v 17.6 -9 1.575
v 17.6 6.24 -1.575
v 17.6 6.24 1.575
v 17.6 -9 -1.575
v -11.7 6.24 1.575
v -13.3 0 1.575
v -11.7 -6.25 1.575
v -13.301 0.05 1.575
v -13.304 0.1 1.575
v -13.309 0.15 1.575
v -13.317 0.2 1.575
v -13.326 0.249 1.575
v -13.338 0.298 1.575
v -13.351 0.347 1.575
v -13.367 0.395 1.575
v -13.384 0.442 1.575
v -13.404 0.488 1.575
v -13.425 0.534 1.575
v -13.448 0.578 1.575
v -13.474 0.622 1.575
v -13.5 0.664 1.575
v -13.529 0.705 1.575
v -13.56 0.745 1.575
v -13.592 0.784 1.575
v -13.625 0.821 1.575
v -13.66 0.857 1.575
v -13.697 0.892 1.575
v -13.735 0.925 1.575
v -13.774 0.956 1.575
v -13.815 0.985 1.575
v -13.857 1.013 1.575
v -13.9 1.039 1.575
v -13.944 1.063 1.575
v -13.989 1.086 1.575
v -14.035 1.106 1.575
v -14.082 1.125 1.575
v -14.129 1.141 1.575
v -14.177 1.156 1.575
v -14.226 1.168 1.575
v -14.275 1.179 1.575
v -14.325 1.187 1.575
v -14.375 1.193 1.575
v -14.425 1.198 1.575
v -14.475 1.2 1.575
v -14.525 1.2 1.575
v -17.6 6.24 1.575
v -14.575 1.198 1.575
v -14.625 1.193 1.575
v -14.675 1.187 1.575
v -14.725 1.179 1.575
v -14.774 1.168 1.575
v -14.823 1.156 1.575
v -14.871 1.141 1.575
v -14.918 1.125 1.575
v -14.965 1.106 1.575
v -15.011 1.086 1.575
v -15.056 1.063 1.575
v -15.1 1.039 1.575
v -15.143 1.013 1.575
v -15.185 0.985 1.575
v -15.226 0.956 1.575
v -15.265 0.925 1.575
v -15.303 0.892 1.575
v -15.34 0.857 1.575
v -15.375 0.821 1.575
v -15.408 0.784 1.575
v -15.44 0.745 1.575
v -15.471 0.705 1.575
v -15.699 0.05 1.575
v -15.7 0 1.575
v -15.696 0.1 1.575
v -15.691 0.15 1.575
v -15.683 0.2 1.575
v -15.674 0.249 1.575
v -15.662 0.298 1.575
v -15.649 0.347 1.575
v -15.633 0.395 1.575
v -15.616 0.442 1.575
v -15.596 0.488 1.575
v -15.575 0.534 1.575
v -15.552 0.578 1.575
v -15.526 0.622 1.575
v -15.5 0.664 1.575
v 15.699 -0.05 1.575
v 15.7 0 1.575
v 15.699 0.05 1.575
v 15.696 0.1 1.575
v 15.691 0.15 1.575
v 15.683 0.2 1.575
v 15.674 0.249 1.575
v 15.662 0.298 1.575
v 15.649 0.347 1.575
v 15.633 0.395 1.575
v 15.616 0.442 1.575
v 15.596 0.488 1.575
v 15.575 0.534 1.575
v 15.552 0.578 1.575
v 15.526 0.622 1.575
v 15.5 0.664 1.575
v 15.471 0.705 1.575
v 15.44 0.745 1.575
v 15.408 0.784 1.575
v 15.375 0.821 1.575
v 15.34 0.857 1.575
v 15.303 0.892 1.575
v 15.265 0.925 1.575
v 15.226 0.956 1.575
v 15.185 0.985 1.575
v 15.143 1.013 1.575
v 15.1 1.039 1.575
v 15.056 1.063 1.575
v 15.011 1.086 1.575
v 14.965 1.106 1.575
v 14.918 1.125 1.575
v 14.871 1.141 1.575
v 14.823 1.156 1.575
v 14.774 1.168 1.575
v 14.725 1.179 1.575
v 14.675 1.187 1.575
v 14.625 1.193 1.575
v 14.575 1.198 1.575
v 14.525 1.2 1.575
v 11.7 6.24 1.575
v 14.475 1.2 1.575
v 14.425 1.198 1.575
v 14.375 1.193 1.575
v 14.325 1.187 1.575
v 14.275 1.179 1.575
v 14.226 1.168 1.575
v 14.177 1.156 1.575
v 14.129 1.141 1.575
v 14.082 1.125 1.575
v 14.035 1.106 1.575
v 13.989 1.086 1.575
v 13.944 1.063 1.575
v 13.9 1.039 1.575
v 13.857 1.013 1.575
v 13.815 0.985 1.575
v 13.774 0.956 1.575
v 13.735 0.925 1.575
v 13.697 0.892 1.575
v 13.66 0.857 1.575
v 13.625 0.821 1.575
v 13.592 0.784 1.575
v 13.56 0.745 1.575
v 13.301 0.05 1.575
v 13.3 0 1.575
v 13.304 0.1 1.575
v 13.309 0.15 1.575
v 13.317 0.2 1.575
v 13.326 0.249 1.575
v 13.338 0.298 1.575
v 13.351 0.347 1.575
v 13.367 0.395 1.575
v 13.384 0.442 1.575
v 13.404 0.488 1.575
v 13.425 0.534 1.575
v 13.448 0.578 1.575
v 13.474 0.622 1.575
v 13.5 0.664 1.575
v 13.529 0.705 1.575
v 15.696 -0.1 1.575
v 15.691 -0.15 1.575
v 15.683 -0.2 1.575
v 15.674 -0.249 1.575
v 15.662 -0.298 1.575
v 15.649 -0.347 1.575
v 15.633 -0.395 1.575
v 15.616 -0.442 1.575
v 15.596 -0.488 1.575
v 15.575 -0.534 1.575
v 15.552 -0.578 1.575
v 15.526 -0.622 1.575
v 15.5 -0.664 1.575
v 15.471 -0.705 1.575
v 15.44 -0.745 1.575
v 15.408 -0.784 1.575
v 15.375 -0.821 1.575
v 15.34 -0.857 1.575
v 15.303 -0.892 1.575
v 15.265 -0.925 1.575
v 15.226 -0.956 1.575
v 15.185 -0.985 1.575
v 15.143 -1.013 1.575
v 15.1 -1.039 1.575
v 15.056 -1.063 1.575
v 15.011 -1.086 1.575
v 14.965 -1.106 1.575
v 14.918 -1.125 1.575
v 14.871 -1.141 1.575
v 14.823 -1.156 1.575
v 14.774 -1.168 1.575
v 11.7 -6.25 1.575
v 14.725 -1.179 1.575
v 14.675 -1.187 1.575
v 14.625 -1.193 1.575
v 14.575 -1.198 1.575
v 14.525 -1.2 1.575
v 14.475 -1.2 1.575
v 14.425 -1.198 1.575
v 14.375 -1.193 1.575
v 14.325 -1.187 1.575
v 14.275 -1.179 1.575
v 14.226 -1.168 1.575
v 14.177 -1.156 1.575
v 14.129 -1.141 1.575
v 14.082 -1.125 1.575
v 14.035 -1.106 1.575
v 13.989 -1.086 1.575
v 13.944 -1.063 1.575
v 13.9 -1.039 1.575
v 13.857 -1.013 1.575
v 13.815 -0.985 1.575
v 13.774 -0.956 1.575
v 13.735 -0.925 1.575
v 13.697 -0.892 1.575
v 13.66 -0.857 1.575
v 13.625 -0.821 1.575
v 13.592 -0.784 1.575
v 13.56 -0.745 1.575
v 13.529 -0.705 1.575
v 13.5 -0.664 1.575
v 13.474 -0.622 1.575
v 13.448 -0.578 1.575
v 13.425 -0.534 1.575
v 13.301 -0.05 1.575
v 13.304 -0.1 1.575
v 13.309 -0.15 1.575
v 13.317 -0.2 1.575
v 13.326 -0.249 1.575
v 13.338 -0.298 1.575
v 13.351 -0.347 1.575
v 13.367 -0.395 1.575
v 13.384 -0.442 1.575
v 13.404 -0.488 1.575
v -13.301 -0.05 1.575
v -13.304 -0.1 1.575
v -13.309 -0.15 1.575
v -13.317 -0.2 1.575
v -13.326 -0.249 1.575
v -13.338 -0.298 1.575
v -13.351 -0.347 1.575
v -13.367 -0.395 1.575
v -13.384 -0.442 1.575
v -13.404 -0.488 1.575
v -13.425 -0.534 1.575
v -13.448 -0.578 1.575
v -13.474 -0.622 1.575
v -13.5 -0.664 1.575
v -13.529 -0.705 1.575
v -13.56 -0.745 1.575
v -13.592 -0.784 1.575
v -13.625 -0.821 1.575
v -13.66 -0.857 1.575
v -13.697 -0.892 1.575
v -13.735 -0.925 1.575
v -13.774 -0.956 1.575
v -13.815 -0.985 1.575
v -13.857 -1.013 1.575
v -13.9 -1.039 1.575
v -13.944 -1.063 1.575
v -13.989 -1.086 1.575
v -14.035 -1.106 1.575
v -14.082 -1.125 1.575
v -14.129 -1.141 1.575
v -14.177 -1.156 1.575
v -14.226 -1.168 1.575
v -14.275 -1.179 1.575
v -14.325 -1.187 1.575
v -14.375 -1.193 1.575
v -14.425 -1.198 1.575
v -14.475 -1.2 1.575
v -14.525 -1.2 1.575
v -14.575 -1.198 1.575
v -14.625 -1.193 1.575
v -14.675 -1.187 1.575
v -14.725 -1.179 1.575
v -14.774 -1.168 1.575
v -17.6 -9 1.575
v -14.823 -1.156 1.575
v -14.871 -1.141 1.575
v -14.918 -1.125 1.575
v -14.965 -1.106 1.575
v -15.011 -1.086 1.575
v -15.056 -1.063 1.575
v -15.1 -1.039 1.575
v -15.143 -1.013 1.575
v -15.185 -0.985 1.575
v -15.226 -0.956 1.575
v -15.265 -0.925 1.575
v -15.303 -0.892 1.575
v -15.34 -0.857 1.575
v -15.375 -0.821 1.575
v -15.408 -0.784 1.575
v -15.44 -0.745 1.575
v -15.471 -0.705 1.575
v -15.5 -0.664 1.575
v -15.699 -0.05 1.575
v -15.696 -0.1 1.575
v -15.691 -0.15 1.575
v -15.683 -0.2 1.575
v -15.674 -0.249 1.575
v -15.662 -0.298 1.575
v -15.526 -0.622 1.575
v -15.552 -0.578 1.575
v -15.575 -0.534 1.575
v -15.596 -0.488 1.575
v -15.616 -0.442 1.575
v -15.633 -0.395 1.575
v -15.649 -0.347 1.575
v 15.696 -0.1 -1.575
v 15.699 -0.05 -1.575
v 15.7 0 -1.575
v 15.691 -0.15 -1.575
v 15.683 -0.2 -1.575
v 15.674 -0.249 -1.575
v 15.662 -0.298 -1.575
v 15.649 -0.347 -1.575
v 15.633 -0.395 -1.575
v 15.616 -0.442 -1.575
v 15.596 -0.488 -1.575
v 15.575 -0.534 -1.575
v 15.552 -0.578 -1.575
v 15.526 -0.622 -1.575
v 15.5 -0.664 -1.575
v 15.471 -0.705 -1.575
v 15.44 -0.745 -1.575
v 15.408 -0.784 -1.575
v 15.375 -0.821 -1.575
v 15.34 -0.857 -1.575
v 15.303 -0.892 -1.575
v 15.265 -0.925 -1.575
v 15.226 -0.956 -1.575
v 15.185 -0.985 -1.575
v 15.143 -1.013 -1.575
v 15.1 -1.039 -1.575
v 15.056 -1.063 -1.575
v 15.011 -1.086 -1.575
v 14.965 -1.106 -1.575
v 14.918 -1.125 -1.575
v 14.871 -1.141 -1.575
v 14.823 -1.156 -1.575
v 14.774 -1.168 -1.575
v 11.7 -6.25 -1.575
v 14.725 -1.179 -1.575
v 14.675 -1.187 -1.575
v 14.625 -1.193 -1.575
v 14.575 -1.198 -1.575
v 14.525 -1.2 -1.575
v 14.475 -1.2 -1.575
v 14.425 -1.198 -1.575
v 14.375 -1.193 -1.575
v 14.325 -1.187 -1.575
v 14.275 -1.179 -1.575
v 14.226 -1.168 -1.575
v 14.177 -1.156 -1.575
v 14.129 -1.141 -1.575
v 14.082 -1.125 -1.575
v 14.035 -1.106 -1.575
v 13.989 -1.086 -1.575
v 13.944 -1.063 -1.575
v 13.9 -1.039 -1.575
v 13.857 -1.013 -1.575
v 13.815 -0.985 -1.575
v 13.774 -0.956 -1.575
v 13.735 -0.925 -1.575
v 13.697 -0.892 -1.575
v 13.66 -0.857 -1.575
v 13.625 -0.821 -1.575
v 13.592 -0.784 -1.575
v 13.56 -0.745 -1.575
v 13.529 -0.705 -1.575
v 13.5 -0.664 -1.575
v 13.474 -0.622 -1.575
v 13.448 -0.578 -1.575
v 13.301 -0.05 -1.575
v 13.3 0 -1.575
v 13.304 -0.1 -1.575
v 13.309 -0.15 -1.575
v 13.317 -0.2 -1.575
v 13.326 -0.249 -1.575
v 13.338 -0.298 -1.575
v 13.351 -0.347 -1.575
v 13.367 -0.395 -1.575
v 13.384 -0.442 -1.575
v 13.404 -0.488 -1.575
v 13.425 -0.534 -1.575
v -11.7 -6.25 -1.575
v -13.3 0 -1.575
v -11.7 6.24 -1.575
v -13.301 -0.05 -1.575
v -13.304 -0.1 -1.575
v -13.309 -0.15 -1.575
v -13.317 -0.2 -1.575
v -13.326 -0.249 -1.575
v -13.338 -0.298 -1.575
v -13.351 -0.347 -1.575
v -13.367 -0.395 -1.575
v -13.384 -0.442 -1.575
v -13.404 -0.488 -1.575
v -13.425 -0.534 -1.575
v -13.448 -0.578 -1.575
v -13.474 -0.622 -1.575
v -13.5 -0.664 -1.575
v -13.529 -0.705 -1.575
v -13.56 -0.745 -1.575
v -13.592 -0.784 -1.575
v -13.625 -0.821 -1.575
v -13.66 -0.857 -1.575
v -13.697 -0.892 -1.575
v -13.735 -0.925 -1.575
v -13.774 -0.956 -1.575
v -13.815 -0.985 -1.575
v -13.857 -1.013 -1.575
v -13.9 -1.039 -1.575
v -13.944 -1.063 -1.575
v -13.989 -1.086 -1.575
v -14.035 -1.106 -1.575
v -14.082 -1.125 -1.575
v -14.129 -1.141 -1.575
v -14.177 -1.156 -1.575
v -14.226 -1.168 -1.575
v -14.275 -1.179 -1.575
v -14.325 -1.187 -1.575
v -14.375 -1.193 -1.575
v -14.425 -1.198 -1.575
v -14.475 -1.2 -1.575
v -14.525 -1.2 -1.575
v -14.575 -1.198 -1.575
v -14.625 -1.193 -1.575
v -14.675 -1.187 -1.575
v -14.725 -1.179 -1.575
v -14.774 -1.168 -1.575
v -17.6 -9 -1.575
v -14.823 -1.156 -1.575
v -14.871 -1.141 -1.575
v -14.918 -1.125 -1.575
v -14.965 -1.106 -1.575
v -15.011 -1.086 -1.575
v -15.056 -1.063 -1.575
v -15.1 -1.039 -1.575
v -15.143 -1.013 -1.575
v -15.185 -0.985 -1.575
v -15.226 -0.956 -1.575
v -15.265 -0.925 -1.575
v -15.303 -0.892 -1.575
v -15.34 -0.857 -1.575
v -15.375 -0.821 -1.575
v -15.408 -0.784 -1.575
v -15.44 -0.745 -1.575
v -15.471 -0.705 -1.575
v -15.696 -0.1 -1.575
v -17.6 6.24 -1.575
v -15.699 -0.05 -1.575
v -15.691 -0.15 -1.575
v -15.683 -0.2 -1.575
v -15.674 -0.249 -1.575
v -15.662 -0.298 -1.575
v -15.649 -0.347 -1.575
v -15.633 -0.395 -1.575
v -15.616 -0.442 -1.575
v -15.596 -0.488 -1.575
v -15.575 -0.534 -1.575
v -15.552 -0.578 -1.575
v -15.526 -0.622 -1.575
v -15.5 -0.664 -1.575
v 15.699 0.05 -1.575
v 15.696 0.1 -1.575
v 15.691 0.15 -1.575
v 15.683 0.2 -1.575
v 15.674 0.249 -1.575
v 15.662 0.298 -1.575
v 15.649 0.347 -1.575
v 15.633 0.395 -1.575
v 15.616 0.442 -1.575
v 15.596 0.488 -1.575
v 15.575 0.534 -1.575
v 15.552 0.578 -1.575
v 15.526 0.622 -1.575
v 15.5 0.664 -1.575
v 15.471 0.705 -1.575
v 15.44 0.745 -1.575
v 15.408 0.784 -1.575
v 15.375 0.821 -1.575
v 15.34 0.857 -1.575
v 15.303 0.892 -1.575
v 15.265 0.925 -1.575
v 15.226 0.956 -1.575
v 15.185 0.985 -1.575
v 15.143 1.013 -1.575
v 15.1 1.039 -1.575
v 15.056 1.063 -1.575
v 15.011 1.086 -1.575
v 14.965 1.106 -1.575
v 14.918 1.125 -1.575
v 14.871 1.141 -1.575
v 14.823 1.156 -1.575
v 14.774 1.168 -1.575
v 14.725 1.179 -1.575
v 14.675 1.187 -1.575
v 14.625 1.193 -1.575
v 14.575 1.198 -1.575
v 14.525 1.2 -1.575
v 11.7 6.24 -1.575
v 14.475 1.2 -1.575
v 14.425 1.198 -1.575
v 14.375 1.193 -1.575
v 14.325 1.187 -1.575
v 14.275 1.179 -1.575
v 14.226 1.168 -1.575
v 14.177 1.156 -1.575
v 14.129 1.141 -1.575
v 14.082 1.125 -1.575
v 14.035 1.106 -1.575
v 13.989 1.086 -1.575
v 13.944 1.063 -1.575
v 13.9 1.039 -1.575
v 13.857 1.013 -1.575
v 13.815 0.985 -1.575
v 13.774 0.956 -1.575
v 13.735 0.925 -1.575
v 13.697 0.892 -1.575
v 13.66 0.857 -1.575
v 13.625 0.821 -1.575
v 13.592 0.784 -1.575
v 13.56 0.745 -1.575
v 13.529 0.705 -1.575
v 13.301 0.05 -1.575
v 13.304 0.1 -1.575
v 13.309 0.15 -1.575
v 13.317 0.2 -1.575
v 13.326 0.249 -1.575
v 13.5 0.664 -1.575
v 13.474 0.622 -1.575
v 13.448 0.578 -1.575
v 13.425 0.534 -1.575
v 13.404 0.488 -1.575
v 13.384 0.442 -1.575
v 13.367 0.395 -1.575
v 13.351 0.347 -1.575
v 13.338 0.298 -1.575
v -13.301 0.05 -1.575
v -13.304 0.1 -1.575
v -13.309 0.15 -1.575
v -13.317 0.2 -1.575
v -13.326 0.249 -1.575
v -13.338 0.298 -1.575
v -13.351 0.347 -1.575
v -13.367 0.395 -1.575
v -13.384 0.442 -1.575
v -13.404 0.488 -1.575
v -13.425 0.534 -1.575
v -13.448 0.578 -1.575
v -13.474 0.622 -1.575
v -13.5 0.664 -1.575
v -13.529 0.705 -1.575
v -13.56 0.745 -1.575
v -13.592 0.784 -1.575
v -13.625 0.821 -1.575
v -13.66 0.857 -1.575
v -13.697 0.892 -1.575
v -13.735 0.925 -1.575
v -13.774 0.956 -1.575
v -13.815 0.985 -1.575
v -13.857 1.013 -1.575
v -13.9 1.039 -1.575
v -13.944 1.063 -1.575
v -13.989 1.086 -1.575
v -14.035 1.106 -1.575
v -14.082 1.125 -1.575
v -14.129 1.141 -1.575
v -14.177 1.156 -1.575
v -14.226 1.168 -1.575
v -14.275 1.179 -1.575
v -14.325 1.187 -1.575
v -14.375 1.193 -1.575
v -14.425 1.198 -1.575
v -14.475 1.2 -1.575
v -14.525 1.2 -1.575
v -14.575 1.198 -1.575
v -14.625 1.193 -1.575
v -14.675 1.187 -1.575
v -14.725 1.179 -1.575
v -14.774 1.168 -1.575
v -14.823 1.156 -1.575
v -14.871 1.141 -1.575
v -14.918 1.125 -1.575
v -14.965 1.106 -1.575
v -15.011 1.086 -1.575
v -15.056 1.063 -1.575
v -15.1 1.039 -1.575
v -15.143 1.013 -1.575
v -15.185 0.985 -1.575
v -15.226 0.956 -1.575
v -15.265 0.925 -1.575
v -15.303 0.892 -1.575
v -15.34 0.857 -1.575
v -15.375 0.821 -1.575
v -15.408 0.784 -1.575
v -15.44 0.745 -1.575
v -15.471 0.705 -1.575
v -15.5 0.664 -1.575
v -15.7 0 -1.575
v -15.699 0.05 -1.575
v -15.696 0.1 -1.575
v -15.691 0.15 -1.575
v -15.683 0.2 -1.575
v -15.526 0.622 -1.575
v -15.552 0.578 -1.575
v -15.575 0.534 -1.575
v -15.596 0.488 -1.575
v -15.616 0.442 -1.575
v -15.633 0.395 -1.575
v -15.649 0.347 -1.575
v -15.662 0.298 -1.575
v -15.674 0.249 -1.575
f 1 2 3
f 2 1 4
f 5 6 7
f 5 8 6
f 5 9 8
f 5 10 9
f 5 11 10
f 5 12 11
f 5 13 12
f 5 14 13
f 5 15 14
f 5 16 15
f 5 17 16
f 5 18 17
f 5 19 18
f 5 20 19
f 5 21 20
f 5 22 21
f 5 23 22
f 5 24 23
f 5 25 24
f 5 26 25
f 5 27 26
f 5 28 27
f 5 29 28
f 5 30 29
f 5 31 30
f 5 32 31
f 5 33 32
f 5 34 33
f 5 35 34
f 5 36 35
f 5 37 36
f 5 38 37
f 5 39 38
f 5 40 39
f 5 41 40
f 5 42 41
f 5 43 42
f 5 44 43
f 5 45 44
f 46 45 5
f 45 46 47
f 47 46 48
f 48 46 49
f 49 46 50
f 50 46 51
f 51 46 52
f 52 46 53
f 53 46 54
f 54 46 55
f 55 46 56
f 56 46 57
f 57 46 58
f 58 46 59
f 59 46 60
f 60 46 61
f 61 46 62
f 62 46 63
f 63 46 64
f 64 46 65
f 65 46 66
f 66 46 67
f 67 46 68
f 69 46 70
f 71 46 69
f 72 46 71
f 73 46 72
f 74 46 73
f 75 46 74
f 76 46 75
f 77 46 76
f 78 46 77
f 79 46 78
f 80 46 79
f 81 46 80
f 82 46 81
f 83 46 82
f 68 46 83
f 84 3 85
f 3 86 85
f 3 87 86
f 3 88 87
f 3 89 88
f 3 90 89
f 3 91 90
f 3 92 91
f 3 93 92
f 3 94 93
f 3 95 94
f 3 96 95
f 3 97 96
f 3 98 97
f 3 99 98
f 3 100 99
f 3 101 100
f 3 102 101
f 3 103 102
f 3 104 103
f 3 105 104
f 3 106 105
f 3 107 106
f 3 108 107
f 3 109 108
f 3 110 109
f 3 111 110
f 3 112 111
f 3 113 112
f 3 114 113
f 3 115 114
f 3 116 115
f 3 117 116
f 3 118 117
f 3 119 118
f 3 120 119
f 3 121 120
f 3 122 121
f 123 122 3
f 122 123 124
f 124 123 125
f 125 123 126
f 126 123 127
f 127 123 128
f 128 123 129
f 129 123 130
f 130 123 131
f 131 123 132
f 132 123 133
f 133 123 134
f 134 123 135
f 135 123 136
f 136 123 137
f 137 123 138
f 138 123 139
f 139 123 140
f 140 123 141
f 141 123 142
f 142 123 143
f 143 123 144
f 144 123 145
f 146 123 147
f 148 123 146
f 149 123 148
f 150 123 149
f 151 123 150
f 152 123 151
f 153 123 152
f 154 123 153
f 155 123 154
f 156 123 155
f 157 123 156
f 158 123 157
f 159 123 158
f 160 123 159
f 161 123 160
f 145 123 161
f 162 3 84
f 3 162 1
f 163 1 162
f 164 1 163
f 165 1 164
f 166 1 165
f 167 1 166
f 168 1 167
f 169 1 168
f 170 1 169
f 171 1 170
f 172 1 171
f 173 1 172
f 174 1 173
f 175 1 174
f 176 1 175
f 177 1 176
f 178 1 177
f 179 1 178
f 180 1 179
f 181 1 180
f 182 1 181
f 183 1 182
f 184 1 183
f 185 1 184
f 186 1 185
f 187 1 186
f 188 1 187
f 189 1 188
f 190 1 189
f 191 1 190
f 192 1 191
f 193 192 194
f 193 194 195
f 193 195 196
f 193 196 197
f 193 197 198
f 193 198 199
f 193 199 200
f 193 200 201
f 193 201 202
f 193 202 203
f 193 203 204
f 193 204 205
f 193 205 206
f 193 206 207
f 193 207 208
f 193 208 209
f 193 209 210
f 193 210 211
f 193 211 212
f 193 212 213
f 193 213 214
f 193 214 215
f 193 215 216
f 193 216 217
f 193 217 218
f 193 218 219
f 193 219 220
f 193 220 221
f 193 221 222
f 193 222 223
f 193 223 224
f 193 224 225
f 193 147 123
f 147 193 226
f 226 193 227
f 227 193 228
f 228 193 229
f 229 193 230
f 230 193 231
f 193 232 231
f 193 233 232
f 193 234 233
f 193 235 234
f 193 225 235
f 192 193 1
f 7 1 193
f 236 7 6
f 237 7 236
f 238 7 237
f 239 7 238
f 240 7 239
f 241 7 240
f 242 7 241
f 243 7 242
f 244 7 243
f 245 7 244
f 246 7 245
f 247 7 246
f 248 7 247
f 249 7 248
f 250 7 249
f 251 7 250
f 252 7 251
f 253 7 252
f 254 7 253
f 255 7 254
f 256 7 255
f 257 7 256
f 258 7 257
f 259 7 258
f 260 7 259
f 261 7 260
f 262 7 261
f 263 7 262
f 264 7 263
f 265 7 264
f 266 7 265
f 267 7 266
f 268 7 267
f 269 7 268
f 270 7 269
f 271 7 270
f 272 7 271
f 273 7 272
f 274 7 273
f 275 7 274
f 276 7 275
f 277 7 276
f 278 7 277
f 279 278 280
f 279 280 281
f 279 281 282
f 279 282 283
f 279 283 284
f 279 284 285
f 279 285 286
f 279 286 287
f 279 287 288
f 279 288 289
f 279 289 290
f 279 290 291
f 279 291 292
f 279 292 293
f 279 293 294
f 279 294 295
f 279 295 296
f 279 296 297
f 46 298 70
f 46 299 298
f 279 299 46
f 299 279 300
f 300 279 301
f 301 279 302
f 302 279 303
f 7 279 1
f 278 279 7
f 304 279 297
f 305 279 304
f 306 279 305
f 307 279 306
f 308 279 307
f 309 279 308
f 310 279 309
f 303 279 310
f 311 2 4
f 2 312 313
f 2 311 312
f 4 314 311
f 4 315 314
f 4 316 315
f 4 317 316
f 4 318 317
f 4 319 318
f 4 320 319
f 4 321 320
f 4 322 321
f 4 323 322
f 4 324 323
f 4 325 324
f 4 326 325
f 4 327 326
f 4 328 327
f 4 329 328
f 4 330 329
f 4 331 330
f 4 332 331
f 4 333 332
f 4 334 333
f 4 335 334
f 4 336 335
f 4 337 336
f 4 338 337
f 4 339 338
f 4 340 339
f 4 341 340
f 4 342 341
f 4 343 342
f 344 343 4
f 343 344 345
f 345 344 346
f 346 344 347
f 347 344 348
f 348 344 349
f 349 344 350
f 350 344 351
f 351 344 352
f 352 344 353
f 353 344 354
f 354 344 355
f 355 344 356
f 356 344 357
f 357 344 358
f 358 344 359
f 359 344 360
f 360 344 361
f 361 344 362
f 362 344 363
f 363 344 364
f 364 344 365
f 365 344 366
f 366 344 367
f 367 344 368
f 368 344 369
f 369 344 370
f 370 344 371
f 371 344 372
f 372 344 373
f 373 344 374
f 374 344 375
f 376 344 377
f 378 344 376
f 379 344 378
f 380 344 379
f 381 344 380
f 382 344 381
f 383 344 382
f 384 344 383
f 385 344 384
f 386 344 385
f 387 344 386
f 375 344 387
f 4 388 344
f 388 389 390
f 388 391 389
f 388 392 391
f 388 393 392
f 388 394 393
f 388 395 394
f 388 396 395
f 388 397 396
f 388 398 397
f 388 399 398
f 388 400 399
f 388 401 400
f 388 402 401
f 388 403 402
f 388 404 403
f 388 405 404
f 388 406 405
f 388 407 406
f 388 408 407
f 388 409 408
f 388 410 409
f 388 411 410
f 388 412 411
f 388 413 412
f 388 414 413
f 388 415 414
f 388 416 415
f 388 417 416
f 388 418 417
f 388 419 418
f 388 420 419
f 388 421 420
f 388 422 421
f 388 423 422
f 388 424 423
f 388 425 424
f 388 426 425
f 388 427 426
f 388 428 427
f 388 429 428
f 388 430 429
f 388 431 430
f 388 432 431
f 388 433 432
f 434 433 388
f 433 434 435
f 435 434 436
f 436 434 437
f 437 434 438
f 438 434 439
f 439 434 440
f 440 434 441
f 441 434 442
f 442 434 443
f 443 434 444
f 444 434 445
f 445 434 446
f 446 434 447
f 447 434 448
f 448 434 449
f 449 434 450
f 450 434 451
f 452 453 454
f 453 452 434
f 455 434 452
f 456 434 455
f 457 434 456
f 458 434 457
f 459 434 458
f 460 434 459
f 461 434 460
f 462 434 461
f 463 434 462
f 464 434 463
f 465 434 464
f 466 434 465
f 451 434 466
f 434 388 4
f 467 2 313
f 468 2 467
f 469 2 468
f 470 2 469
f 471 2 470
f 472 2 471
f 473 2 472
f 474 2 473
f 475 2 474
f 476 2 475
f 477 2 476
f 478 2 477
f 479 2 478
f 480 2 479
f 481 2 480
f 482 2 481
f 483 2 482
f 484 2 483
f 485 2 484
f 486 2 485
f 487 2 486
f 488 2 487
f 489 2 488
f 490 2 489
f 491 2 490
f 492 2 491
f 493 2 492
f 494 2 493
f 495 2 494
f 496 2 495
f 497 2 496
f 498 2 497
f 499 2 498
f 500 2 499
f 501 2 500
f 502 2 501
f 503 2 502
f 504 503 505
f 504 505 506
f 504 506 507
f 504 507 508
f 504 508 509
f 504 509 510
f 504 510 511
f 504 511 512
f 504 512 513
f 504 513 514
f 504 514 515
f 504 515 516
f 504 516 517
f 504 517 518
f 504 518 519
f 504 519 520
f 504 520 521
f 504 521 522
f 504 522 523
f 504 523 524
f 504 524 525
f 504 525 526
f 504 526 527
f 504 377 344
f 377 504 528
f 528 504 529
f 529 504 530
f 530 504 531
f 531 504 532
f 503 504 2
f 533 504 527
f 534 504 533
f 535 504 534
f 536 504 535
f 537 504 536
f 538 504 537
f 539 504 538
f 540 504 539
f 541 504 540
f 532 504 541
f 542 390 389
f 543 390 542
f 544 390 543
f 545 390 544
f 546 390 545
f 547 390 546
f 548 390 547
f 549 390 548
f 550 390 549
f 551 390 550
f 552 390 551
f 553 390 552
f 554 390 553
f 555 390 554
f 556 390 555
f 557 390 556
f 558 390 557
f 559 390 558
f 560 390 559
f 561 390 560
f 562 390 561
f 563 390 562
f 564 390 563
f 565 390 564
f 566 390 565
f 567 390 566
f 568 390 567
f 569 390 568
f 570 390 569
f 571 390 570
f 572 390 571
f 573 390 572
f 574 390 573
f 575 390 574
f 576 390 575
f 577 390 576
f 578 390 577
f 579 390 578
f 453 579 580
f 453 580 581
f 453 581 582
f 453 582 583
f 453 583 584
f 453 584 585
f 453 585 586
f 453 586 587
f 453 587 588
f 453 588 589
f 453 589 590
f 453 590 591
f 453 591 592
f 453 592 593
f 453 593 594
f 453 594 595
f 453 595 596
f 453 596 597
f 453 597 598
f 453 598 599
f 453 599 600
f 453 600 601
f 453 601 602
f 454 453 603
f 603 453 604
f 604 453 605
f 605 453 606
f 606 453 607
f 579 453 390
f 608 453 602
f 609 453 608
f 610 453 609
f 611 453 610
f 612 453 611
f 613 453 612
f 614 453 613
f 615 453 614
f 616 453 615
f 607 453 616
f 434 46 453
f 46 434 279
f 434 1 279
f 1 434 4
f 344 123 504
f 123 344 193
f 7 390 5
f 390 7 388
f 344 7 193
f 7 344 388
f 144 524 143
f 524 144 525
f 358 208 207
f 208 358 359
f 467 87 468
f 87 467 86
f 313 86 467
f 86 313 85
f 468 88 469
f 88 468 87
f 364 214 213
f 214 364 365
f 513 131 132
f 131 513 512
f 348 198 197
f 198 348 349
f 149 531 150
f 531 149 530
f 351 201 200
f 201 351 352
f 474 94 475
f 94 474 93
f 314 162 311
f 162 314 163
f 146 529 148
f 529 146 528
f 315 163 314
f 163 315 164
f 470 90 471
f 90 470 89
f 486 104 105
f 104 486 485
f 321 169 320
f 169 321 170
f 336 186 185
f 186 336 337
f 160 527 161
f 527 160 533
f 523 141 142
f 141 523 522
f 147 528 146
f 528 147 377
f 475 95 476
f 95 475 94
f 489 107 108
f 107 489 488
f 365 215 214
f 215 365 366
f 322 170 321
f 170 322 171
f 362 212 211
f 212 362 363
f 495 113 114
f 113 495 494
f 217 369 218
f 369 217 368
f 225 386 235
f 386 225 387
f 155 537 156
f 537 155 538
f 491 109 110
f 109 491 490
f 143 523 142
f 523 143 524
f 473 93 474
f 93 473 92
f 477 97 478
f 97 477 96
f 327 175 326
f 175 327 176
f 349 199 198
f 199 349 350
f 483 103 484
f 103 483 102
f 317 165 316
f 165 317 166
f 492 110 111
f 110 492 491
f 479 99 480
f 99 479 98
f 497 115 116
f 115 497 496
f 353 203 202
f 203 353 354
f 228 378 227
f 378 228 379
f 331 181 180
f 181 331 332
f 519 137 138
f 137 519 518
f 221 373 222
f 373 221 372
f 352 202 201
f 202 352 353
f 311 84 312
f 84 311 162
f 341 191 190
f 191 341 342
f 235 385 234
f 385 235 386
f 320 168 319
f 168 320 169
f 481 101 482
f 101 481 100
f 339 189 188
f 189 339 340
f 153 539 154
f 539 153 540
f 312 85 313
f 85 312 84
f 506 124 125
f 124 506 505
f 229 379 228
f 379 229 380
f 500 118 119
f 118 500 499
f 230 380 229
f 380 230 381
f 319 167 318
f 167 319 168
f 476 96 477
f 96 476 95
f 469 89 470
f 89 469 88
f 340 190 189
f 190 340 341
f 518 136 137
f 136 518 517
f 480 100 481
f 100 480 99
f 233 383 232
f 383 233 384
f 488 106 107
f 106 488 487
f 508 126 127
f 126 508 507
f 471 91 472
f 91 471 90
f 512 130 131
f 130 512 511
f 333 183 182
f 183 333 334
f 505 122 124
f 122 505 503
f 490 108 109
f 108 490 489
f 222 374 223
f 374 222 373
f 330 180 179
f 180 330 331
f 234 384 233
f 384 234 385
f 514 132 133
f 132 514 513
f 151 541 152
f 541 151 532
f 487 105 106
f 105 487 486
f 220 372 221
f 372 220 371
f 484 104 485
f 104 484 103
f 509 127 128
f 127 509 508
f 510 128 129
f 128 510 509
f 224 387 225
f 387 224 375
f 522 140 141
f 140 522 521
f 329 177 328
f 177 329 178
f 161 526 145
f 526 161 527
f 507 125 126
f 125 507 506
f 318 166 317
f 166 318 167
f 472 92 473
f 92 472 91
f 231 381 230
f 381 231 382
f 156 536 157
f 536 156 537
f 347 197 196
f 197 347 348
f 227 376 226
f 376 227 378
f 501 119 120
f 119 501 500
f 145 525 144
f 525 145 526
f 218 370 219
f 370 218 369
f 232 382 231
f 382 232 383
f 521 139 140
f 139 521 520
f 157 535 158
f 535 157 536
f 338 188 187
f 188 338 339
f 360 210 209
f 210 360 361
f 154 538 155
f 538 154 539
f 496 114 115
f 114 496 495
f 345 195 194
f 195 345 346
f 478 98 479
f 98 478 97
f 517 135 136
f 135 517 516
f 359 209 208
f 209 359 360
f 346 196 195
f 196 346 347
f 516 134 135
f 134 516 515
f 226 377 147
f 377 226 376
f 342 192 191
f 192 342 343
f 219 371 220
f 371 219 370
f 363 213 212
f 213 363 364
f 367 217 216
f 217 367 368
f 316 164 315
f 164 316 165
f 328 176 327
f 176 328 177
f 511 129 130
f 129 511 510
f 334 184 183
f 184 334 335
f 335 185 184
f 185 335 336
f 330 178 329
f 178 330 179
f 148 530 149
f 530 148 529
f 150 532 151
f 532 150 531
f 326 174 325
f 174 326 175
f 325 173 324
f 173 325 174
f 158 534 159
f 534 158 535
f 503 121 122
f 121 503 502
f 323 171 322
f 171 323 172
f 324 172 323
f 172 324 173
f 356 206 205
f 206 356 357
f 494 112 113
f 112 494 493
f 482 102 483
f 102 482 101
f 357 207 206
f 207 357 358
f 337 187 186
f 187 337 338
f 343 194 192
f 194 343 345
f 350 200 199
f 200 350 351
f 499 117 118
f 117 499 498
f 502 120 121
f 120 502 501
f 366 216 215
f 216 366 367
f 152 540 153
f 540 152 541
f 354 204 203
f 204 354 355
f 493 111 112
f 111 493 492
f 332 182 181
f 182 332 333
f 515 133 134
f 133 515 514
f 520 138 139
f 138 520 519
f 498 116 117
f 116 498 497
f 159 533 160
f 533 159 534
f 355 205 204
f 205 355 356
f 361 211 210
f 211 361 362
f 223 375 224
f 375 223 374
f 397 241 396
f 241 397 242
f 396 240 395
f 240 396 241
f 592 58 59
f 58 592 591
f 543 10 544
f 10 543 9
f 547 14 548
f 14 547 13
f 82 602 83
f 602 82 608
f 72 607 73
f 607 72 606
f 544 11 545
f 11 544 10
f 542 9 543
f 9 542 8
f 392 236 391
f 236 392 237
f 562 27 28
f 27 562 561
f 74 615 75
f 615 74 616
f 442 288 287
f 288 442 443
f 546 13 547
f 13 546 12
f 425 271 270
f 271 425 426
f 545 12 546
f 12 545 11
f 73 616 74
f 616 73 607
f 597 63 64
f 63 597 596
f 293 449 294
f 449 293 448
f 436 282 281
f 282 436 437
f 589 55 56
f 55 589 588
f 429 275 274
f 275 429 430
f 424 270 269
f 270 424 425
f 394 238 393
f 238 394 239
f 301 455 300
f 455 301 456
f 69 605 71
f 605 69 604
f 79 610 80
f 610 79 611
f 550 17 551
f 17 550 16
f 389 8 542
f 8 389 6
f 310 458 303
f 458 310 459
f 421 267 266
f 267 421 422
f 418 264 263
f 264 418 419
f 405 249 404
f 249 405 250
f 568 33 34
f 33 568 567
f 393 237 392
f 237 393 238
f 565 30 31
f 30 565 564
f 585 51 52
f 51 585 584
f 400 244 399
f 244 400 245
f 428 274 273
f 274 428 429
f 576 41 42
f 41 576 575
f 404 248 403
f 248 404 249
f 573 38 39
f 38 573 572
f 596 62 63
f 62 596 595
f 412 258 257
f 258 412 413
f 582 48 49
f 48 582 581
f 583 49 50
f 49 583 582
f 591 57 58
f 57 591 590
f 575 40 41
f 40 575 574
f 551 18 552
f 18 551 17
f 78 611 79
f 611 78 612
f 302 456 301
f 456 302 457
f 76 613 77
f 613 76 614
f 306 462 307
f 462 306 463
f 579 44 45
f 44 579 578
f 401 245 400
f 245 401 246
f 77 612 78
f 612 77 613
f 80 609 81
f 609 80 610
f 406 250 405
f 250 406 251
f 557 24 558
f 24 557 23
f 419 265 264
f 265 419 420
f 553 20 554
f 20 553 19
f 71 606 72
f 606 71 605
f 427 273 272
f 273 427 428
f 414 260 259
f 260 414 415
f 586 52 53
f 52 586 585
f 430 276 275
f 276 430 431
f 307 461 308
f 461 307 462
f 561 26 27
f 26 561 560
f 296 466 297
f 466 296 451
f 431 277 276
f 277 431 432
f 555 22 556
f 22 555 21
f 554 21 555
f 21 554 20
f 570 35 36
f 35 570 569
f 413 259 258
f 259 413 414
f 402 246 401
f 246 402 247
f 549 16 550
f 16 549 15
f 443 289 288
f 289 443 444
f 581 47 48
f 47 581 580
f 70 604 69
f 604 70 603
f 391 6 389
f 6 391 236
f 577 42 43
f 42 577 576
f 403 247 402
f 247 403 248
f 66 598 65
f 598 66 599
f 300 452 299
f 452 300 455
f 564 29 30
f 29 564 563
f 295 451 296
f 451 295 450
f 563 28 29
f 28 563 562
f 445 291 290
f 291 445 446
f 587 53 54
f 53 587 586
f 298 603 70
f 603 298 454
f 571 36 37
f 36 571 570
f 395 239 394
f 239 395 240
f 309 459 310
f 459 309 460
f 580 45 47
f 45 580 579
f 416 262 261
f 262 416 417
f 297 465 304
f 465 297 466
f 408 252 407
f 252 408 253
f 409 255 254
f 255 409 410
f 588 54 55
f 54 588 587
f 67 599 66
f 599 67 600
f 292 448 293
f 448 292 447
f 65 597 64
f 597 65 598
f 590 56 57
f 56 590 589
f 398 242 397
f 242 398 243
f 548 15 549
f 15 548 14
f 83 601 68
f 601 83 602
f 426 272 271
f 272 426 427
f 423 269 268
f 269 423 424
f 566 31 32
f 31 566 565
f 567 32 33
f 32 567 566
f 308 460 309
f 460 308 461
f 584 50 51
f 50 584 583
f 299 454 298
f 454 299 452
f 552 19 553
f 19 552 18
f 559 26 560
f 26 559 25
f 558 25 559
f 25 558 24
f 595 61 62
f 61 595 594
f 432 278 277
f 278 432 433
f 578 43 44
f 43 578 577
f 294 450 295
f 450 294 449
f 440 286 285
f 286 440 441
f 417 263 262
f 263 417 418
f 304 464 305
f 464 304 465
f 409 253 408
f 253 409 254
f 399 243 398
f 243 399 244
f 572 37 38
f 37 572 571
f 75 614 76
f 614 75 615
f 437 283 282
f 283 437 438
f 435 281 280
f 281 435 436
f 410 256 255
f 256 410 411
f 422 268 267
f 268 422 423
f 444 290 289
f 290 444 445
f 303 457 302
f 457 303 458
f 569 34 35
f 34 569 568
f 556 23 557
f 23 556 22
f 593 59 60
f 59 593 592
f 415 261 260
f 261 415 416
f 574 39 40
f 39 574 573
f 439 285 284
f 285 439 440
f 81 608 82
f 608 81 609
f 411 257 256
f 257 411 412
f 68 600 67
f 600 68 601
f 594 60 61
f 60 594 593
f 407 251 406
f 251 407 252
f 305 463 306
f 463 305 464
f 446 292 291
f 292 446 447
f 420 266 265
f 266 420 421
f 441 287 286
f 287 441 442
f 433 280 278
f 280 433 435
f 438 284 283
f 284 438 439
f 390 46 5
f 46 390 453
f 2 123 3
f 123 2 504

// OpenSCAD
$fn=150;

difference()
{
    cube([35.2,18,3.15],center= true);          //Main body
cube([23.4,12.5,4],center= true);               //Servo cut out
   translate([14.5,0,-2]) cylinder(h=5, r=1.2);   // Screw hole + direction
translate([-14.5,0,-2]) cylinder(h=5, r=1.2);     // Screw hole - direction 
 translate([-20,6.24,-2])cube([40,15,4]);       //Cut off bar  + direction
} 
